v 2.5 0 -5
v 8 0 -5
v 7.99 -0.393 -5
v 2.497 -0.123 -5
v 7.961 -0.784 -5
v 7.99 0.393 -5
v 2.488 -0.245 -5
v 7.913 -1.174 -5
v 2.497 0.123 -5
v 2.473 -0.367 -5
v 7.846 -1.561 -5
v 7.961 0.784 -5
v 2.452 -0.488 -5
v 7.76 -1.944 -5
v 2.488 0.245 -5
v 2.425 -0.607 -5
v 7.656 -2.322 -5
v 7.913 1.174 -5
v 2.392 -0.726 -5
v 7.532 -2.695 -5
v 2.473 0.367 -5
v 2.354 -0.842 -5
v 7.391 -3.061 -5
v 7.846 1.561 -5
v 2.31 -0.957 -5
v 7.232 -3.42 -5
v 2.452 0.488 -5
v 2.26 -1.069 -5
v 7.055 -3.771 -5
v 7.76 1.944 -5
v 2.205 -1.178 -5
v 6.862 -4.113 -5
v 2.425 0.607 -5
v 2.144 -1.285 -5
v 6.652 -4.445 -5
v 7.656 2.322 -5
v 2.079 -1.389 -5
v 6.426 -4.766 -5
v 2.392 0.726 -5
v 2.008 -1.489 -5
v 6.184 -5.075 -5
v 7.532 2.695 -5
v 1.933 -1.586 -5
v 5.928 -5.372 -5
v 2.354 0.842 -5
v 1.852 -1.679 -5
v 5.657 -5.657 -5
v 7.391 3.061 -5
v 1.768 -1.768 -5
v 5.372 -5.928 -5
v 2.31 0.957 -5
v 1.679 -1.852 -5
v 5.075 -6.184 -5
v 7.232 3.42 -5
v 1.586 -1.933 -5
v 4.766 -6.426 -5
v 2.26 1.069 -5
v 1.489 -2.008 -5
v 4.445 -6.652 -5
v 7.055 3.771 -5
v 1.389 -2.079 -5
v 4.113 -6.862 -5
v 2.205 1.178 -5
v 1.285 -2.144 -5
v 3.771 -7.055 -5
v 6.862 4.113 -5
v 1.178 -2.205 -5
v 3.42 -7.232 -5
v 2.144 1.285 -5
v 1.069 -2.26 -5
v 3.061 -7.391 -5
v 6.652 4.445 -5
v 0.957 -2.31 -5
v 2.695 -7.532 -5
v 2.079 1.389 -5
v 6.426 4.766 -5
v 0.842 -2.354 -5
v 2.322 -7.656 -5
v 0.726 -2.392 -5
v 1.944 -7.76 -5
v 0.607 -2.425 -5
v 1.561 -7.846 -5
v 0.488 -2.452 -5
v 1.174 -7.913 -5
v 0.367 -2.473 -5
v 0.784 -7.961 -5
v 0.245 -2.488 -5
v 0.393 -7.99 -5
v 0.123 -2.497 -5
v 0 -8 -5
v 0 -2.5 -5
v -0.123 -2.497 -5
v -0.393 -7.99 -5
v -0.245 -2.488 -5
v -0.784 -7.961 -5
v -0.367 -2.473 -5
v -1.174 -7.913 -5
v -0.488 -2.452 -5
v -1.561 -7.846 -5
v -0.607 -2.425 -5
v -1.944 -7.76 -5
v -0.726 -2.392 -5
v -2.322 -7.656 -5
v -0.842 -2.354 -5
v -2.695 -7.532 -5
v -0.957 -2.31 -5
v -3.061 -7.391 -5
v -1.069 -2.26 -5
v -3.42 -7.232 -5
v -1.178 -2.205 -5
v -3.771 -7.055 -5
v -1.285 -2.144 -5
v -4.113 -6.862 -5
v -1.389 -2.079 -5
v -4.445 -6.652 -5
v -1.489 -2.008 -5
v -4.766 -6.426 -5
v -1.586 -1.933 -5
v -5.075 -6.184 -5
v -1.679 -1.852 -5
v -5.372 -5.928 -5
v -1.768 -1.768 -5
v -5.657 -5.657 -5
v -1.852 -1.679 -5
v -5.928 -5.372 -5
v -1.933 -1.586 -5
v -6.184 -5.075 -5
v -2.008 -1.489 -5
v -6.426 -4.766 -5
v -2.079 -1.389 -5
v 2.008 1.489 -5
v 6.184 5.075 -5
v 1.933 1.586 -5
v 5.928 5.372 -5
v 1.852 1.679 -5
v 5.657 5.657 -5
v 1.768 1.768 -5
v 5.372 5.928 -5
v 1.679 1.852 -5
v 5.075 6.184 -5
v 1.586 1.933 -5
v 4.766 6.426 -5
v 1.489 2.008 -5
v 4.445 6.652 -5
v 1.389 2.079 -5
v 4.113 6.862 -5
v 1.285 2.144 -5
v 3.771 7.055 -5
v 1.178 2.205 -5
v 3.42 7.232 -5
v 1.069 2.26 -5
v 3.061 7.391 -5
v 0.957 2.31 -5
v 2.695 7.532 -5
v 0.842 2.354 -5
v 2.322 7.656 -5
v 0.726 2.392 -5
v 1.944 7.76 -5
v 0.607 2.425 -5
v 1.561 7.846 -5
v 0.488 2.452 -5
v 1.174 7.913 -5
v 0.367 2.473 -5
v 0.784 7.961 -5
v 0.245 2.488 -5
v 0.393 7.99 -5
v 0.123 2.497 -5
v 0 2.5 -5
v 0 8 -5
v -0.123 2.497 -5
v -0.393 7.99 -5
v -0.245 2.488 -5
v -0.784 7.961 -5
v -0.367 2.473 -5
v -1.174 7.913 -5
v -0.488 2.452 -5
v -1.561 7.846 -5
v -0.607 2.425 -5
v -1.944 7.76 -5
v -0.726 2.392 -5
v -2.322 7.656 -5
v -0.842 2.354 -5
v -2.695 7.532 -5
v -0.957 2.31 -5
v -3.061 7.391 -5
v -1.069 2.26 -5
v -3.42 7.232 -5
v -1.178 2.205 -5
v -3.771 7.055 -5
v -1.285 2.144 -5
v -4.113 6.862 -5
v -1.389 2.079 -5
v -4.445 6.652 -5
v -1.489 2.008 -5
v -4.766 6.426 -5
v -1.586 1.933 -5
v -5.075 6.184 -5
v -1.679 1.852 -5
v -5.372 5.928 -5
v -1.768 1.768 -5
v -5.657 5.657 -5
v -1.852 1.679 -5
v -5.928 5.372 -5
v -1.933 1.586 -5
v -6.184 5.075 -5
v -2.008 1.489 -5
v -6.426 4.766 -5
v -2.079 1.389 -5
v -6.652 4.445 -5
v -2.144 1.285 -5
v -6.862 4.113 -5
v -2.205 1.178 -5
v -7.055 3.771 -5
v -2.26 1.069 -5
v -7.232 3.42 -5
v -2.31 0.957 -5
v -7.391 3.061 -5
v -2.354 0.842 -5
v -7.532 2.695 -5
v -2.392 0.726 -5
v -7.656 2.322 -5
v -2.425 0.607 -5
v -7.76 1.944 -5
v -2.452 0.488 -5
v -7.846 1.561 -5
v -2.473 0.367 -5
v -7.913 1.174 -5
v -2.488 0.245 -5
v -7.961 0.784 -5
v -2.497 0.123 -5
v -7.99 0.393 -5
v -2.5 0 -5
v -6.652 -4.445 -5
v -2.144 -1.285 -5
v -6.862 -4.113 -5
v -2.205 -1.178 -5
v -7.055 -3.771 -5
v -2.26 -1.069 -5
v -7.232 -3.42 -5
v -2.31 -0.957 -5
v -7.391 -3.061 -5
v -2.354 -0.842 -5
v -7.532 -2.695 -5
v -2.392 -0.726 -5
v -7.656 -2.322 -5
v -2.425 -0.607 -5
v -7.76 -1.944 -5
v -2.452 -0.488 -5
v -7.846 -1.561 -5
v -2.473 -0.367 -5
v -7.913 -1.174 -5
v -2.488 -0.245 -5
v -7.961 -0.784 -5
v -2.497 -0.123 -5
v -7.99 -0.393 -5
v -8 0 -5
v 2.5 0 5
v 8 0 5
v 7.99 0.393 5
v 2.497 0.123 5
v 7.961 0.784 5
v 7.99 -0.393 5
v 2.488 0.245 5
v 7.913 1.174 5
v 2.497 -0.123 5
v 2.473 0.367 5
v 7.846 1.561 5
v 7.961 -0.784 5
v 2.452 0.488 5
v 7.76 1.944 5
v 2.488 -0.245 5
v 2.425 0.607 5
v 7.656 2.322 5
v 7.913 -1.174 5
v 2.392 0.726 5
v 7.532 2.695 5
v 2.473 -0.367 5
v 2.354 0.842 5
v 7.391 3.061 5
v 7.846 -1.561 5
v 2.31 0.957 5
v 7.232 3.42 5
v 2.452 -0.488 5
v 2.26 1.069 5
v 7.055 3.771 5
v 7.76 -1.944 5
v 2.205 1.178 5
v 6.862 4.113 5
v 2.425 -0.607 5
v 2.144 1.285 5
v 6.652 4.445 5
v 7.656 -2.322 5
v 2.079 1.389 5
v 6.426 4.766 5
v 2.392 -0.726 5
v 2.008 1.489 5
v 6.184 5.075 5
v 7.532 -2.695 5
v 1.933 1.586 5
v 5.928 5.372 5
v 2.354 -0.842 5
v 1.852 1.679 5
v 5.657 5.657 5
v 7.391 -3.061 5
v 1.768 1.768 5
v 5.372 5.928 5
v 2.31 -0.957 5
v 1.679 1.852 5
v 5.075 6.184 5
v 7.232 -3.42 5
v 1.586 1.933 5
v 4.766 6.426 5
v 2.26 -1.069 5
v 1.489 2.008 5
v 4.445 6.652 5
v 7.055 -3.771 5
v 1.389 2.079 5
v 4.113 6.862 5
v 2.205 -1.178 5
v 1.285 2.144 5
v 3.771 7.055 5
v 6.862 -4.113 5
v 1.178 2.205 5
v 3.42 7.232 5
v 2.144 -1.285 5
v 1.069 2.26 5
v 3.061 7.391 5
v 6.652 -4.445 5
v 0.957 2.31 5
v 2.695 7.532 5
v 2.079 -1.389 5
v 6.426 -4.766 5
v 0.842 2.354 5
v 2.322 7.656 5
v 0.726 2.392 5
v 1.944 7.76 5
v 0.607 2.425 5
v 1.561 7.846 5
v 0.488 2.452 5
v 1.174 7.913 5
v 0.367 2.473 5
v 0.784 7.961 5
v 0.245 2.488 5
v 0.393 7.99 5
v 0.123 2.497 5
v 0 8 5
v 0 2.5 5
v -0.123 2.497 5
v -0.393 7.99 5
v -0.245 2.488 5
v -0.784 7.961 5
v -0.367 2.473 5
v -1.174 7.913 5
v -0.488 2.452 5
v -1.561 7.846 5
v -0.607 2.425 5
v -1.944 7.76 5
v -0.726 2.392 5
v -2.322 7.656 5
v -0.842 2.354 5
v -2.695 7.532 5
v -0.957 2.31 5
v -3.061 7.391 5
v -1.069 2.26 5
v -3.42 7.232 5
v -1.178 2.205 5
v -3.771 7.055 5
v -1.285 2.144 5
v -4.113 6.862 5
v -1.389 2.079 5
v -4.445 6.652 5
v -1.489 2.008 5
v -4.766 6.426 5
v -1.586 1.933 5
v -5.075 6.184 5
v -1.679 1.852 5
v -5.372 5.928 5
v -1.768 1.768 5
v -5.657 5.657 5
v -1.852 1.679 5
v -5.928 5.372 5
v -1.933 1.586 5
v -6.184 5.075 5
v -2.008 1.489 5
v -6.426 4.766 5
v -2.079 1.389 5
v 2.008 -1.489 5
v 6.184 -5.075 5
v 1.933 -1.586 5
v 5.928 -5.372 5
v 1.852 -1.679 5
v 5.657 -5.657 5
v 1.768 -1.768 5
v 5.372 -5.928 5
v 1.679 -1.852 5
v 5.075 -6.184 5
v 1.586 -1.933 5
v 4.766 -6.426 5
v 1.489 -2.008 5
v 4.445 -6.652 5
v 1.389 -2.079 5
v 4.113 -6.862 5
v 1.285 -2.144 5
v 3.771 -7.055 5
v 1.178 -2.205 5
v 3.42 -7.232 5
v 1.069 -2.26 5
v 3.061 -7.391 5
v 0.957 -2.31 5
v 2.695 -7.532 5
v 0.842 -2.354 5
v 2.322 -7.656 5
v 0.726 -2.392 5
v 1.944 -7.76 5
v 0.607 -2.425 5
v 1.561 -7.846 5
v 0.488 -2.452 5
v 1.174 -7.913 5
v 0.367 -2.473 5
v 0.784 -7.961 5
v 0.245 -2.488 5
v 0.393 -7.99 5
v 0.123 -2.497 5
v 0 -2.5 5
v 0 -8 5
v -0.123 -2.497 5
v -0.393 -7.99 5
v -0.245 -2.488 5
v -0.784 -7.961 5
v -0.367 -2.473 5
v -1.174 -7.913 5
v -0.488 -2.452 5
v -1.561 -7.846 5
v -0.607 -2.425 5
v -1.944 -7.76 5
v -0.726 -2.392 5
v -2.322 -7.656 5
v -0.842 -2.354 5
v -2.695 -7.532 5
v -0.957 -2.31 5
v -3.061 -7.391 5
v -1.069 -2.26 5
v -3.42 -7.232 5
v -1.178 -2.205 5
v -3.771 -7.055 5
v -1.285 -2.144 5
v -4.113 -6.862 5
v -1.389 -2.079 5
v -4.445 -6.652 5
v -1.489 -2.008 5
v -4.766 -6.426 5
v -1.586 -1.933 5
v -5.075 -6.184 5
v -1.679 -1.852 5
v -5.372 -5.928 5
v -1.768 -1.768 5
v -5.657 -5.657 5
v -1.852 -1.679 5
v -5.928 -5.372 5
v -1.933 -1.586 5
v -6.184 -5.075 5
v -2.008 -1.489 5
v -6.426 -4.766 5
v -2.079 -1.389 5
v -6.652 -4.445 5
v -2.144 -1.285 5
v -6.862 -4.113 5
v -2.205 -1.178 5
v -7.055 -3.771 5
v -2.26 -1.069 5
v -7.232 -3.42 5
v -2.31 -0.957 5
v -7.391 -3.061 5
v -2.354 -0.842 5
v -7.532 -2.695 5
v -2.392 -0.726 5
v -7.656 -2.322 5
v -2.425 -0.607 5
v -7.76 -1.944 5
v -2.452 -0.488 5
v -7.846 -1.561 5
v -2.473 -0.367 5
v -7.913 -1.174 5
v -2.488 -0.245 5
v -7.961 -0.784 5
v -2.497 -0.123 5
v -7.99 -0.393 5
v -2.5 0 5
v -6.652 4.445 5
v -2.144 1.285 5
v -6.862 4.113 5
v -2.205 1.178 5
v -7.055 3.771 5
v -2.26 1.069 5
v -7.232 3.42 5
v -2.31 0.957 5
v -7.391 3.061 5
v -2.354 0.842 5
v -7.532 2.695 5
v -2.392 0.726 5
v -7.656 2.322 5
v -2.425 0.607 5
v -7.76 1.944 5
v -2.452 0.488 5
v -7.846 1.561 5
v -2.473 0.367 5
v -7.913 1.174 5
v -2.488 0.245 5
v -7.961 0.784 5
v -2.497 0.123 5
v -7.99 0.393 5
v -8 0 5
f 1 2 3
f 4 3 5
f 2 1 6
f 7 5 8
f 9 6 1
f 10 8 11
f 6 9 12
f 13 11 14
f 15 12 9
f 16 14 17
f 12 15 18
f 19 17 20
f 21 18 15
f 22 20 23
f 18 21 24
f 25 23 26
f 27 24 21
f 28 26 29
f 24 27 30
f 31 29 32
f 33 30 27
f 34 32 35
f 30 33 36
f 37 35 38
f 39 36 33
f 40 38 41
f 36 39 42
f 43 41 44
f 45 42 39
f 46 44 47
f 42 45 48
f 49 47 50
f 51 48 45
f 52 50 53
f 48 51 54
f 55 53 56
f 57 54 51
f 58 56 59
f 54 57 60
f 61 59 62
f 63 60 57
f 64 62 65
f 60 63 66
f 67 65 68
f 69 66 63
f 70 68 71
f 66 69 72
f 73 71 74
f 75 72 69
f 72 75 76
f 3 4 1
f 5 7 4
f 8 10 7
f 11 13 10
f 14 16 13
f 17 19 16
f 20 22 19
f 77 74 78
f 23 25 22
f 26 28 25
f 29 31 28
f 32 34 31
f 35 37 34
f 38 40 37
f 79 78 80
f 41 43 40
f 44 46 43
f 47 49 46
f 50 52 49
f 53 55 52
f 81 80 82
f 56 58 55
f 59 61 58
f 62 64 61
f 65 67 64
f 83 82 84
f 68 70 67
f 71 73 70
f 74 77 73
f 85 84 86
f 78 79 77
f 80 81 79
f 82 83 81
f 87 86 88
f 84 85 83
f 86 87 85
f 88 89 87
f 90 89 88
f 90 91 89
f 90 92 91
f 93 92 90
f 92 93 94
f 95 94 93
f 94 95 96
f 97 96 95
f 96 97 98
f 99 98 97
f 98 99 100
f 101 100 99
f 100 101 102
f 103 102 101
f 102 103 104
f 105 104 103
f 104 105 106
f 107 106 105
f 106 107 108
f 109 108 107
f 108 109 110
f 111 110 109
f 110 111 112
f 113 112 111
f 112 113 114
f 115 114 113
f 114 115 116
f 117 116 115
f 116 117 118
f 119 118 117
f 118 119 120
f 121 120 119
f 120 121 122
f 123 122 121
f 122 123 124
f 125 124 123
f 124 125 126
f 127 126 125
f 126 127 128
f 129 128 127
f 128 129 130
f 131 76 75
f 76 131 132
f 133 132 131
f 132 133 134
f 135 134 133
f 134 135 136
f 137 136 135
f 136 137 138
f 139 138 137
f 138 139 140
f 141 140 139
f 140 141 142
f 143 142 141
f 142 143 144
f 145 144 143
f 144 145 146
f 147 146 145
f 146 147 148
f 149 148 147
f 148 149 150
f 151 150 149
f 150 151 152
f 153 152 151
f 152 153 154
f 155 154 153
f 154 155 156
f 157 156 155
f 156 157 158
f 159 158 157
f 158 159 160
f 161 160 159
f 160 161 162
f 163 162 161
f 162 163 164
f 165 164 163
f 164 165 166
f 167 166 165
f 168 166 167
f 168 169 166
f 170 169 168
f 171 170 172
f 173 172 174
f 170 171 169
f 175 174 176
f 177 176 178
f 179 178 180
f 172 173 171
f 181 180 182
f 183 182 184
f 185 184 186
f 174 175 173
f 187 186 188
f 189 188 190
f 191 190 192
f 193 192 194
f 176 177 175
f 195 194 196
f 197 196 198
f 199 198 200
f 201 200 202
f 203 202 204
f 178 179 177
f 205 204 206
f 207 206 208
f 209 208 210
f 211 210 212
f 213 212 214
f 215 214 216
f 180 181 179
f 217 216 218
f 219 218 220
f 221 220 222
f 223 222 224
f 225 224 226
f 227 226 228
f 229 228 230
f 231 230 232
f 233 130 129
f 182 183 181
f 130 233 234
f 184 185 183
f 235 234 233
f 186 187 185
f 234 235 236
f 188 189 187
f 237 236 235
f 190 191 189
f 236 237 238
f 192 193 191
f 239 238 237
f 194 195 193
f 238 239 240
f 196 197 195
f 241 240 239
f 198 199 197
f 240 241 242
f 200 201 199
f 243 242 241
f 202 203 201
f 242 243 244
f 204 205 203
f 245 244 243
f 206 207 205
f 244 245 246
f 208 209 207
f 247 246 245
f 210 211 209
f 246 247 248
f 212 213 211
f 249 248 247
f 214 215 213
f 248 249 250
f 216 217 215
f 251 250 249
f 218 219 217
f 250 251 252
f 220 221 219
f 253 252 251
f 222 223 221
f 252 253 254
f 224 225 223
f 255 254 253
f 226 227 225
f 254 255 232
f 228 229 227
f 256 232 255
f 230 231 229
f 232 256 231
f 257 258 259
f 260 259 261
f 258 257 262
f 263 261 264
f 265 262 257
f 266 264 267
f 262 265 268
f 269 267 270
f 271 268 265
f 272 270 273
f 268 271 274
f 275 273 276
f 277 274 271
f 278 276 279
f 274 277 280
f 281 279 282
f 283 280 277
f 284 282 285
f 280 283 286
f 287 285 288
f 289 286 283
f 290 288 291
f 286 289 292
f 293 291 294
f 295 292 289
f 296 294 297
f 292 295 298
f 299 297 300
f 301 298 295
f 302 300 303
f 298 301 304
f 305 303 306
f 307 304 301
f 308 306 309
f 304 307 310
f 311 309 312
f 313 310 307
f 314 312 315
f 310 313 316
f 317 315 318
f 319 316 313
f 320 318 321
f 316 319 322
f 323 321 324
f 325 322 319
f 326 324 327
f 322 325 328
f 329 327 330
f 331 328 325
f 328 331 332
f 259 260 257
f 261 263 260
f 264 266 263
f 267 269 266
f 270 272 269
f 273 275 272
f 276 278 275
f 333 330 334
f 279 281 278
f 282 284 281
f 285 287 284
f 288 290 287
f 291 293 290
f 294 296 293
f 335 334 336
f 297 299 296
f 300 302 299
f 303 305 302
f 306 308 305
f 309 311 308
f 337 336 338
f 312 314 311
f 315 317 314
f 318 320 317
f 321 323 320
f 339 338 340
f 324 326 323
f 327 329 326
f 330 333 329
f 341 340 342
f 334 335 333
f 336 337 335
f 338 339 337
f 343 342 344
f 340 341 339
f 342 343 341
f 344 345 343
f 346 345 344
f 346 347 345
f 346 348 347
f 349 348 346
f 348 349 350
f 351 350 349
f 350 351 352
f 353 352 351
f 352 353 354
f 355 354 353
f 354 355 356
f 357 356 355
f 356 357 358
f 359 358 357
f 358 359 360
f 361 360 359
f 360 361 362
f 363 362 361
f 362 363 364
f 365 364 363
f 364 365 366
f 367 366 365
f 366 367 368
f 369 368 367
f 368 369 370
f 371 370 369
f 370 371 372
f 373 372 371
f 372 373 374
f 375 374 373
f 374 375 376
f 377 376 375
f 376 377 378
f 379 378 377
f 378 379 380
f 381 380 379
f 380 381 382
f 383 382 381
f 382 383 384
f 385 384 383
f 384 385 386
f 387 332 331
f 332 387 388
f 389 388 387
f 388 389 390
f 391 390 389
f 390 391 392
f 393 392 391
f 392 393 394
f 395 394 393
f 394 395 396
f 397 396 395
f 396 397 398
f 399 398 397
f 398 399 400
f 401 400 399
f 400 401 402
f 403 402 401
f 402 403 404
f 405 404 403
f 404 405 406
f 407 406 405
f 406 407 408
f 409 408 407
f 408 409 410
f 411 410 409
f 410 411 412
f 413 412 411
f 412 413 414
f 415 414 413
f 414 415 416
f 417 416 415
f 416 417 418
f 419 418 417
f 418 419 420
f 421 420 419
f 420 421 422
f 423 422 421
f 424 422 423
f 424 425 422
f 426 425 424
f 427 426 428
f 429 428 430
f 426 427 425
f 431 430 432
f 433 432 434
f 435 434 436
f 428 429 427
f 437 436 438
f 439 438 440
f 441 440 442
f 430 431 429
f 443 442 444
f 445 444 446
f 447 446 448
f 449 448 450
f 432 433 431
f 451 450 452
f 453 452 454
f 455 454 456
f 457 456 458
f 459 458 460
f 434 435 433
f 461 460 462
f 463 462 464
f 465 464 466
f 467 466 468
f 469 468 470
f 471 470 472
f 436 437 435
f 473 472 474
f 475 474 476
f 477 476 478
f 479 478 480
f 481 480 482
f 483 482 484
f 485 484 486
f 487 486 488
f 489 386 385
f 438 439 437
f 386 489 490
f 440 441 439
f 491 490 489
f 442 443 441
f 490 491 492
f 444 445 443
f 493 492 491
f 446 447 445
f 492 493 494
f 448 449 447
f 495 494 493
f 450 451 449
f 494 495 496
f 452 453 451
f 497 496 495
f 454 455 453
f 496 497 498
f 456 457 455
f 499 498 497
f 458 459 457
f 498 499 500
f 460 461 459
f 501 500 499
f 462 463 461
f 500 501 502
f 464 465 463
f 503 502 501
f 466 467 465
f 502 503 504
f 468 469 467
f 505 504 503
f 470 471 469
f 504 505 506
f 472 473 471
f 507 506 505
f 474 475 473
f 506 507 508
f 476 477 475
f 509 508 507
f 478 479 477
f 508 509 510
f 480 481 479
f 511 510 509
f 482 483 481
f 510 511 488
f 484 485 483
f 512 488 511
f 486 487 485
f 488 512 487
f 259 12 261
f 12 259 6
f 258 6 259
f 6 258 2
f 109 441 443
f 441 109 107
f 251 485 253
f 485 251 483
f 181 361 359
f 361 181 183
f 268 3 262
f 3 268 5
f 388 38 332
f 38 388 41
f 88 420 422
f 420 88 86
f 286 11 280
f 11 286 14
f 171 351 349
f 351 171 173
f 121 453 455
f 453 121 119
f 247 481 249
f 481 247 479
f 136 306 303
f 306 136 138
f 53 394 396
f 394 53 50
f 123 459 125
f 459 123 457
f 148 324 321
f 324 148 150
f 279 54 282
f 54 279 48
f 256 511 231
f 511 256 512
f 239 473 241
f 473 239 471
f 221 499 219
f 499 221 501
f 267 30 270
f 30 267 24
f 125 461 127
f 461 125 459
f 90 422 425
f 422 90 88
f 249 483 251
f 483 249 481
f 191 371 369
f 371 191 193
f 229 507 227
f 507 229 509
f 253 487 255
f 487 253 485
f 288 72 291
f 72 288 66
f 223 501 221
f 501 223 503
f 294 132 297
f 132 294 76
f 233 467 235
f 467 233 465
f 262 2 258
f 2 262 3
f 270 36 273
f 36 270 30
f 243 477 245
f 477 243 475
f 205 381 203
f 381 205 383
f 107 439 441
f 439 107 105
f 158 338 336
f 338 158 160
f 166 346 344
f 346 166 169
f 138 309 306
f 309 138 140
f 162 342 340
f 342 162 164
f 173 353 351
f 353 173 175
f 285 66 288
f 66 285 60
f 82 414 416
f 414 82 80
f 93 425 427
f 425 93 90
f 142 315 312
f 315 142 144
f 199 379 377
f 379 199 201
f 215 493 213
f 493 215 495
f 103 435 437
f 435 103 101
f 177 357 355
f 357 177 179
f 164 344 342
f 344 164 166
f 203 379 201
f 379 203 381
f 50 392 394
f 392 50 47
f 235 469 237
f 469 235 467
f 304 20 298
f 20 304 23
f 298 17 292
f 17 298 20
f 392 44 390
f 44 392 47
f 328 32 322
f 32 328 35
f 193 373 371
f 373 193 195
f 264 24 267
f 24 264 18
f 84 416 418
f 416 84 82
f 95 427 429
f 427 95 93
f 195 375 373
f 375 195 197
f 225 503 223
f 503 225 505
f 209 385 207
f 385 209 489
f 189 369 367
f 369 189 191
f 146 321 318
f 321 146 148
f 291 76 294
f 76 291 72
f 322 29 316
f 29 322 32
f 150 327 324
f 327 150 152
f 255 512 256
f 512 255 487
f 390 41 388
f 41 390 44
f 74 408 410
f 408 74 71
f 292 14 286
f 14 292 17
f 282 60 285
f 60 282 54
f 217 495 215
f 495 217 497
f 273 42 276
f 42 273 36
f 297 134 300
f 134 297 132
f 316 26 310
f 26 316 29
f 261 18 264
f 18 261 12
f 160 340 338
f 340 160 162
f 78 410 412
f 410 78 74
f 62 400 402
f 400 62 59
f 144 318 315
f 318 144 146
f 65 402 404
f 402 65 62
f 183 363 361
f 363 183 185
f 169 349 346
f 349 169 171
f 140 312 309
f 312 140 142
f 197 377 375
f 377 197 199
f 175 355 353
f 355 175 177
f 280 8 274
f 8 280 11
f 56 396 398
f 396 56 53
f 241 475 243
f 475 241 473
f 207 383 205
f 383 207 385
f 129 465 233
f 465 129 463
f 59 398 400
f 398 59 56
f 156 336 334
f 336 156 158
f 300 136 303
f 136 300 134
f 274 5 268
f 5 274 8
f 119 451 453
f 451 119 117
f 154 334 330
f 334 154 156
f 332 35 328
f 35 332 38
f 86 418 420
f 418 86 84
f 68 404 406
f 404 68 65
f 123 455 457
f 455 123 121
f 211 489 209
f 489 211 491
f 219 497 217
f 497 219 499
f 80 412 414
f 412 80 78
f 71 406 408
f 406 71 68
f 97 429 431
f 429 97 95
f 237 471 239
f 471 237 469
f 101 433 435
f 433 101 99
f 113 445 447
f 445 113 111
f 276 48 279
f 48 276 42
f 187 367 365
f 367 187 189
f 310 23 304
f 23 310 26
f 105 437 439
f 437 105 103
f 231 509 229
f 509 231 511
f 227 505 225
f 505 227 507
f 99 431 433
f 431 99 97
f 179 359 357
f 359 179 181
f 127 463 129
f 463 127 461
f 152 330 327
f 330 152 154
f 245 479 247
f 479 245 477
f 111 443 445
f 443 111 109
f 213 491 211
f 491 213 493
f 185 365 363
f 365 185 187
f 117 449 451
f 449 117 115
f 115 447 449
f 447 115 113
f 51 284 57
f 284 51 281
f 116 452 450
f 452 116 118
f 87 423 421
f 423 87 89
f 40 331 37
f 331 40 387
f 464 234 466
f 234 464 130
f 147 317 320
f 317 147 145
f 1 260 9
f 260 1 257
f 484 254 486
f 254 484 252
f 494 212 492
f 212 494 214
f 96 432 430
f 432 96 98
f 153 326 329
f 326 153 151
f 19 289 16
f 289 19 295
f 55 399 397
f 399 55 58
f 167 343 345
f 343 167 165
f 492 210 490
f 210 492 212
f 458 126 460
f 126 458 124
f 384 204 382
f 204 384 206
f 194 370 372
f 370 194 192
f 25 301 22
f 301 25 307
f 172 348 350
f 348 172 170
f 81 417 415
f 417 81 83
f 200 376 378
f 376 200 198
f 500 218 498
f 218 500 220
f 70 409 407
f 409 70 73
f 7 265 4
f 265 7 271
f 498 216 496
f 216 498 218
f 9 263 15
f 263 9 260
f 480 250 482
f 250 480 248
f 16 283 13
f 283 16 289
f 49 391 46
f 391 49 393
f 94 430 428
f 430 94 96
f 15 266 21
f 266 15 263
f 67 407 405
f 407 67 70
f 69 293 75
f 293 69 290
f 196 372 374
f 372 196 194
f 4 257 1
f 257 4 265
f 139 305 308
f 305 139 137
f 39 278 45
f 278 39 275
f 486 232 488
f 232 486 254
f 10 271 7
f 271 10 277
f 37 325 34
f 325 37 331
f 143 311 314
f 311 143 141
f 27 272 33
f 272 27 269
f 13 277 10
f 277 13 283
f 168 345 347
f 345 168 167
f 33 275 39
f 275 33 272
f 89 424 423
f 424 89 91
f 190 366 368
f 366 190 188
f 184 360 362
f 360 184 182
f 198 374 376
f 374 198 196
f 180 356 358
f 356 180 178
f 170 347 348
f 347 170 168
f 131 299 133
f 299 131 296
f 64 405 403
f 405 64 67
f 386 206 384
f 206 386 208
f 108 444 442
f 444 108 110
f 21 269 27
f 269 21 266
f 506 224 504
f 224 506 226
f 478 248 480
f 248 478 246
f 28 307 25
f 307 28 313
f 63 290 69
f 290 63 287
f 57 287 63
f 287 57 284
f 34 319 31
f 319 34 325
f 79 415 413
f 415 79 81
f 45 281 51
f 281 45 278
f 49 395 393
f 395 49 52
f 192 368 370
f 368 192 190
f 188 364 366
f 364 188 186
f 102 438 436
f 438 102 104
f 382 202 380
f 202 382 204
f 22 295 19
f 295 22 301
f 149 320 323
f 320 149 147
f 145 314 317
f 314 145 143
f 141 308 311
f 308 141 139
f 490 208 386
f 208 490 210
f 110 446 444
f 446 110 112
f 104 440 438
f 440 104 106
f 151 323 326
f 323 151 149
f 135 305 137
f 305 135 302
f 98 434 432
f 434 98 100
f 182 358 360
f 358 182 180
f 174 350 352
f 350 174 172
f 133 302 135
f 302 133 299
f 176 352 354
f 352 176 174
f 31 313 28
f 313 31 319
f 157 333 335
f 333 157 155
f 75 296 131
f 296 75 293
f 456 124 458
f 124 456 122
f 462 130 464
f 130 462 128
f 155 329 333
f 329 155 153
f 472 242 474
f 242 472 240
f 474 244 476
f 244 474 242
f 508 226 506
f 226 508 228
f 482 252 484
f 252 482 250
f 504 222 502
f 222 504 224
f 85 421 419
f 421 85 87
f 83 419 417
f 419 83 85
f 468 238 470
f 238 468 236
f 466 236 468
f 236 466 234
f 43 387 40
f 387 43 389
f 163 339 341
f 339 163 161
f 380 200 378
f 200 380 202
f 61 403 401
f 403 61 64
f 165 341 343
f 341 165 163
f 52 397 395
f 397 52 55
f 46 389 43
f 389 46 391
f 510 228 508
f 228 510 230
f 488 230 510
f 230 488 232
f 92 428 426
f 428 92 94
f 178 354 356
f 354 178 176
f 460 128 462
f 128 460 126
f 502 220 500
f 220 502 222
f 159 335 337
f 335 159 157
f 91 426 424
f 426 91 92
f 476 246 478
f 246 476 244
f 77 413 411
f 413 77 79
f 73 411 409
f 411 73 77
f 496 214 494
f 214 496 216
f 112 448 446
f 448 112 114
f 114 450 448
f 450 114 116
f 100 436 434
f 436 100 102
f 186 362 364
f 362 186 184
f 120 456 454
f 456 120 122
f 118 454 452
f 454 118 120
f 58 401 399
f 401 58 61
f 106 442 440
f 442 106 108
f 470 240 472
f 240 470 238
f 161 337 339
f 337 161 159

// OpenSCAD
$fn=128;

teeth = 20;
pitch_d = 12.22;          // mm
pitch_r = pitch_d/2;

pulley_width = 10;        // mm
hub_d = 16;               // mm
bore_d = 5;               // mm

tooth_height = 1.2;       // mm (radial)
tooth_tip_width = 1.2;    // mm (tangential at tip)
tooth_root_width = 0.6;   // mm (tangential at root)
root_relief = 0.4;        // mm (radial relief below pitch circle)

outer_r = pitch_r + tooth_height;
root_r  = max(0.1, pitch_r - root_relief);

module tooth2d(r_base, r_tip, w_base, w_tip){
    polygon(points=[
        [r_base, -w_base/2],
        [r_tip,  -w_tip/2],
        [r_tip,   w_tip/2],
        [r_base,  w_base/2]
    ]);
}

module teeth_ring(){
    for(i=[0:teeth-1]){
        rotate(i*360/teeth)
            linear_extrude(height=pulley_width, center=true, convexity=10)
                tooth2d(root_r, outer_r, tooth_root_width, tooth_tip_width);
    }
}

module pulley_body(){
    union(){
        cylinder(h=pulley_width, r=root_r, center=true);
        teeth_ring();
        cylinder(h=pulley_width, d=hub_d, center=true);
    }
}

difference(){
    pulley_body();
    cylinder(h=pulley_width+2, d=bore_d, center=true);
}
